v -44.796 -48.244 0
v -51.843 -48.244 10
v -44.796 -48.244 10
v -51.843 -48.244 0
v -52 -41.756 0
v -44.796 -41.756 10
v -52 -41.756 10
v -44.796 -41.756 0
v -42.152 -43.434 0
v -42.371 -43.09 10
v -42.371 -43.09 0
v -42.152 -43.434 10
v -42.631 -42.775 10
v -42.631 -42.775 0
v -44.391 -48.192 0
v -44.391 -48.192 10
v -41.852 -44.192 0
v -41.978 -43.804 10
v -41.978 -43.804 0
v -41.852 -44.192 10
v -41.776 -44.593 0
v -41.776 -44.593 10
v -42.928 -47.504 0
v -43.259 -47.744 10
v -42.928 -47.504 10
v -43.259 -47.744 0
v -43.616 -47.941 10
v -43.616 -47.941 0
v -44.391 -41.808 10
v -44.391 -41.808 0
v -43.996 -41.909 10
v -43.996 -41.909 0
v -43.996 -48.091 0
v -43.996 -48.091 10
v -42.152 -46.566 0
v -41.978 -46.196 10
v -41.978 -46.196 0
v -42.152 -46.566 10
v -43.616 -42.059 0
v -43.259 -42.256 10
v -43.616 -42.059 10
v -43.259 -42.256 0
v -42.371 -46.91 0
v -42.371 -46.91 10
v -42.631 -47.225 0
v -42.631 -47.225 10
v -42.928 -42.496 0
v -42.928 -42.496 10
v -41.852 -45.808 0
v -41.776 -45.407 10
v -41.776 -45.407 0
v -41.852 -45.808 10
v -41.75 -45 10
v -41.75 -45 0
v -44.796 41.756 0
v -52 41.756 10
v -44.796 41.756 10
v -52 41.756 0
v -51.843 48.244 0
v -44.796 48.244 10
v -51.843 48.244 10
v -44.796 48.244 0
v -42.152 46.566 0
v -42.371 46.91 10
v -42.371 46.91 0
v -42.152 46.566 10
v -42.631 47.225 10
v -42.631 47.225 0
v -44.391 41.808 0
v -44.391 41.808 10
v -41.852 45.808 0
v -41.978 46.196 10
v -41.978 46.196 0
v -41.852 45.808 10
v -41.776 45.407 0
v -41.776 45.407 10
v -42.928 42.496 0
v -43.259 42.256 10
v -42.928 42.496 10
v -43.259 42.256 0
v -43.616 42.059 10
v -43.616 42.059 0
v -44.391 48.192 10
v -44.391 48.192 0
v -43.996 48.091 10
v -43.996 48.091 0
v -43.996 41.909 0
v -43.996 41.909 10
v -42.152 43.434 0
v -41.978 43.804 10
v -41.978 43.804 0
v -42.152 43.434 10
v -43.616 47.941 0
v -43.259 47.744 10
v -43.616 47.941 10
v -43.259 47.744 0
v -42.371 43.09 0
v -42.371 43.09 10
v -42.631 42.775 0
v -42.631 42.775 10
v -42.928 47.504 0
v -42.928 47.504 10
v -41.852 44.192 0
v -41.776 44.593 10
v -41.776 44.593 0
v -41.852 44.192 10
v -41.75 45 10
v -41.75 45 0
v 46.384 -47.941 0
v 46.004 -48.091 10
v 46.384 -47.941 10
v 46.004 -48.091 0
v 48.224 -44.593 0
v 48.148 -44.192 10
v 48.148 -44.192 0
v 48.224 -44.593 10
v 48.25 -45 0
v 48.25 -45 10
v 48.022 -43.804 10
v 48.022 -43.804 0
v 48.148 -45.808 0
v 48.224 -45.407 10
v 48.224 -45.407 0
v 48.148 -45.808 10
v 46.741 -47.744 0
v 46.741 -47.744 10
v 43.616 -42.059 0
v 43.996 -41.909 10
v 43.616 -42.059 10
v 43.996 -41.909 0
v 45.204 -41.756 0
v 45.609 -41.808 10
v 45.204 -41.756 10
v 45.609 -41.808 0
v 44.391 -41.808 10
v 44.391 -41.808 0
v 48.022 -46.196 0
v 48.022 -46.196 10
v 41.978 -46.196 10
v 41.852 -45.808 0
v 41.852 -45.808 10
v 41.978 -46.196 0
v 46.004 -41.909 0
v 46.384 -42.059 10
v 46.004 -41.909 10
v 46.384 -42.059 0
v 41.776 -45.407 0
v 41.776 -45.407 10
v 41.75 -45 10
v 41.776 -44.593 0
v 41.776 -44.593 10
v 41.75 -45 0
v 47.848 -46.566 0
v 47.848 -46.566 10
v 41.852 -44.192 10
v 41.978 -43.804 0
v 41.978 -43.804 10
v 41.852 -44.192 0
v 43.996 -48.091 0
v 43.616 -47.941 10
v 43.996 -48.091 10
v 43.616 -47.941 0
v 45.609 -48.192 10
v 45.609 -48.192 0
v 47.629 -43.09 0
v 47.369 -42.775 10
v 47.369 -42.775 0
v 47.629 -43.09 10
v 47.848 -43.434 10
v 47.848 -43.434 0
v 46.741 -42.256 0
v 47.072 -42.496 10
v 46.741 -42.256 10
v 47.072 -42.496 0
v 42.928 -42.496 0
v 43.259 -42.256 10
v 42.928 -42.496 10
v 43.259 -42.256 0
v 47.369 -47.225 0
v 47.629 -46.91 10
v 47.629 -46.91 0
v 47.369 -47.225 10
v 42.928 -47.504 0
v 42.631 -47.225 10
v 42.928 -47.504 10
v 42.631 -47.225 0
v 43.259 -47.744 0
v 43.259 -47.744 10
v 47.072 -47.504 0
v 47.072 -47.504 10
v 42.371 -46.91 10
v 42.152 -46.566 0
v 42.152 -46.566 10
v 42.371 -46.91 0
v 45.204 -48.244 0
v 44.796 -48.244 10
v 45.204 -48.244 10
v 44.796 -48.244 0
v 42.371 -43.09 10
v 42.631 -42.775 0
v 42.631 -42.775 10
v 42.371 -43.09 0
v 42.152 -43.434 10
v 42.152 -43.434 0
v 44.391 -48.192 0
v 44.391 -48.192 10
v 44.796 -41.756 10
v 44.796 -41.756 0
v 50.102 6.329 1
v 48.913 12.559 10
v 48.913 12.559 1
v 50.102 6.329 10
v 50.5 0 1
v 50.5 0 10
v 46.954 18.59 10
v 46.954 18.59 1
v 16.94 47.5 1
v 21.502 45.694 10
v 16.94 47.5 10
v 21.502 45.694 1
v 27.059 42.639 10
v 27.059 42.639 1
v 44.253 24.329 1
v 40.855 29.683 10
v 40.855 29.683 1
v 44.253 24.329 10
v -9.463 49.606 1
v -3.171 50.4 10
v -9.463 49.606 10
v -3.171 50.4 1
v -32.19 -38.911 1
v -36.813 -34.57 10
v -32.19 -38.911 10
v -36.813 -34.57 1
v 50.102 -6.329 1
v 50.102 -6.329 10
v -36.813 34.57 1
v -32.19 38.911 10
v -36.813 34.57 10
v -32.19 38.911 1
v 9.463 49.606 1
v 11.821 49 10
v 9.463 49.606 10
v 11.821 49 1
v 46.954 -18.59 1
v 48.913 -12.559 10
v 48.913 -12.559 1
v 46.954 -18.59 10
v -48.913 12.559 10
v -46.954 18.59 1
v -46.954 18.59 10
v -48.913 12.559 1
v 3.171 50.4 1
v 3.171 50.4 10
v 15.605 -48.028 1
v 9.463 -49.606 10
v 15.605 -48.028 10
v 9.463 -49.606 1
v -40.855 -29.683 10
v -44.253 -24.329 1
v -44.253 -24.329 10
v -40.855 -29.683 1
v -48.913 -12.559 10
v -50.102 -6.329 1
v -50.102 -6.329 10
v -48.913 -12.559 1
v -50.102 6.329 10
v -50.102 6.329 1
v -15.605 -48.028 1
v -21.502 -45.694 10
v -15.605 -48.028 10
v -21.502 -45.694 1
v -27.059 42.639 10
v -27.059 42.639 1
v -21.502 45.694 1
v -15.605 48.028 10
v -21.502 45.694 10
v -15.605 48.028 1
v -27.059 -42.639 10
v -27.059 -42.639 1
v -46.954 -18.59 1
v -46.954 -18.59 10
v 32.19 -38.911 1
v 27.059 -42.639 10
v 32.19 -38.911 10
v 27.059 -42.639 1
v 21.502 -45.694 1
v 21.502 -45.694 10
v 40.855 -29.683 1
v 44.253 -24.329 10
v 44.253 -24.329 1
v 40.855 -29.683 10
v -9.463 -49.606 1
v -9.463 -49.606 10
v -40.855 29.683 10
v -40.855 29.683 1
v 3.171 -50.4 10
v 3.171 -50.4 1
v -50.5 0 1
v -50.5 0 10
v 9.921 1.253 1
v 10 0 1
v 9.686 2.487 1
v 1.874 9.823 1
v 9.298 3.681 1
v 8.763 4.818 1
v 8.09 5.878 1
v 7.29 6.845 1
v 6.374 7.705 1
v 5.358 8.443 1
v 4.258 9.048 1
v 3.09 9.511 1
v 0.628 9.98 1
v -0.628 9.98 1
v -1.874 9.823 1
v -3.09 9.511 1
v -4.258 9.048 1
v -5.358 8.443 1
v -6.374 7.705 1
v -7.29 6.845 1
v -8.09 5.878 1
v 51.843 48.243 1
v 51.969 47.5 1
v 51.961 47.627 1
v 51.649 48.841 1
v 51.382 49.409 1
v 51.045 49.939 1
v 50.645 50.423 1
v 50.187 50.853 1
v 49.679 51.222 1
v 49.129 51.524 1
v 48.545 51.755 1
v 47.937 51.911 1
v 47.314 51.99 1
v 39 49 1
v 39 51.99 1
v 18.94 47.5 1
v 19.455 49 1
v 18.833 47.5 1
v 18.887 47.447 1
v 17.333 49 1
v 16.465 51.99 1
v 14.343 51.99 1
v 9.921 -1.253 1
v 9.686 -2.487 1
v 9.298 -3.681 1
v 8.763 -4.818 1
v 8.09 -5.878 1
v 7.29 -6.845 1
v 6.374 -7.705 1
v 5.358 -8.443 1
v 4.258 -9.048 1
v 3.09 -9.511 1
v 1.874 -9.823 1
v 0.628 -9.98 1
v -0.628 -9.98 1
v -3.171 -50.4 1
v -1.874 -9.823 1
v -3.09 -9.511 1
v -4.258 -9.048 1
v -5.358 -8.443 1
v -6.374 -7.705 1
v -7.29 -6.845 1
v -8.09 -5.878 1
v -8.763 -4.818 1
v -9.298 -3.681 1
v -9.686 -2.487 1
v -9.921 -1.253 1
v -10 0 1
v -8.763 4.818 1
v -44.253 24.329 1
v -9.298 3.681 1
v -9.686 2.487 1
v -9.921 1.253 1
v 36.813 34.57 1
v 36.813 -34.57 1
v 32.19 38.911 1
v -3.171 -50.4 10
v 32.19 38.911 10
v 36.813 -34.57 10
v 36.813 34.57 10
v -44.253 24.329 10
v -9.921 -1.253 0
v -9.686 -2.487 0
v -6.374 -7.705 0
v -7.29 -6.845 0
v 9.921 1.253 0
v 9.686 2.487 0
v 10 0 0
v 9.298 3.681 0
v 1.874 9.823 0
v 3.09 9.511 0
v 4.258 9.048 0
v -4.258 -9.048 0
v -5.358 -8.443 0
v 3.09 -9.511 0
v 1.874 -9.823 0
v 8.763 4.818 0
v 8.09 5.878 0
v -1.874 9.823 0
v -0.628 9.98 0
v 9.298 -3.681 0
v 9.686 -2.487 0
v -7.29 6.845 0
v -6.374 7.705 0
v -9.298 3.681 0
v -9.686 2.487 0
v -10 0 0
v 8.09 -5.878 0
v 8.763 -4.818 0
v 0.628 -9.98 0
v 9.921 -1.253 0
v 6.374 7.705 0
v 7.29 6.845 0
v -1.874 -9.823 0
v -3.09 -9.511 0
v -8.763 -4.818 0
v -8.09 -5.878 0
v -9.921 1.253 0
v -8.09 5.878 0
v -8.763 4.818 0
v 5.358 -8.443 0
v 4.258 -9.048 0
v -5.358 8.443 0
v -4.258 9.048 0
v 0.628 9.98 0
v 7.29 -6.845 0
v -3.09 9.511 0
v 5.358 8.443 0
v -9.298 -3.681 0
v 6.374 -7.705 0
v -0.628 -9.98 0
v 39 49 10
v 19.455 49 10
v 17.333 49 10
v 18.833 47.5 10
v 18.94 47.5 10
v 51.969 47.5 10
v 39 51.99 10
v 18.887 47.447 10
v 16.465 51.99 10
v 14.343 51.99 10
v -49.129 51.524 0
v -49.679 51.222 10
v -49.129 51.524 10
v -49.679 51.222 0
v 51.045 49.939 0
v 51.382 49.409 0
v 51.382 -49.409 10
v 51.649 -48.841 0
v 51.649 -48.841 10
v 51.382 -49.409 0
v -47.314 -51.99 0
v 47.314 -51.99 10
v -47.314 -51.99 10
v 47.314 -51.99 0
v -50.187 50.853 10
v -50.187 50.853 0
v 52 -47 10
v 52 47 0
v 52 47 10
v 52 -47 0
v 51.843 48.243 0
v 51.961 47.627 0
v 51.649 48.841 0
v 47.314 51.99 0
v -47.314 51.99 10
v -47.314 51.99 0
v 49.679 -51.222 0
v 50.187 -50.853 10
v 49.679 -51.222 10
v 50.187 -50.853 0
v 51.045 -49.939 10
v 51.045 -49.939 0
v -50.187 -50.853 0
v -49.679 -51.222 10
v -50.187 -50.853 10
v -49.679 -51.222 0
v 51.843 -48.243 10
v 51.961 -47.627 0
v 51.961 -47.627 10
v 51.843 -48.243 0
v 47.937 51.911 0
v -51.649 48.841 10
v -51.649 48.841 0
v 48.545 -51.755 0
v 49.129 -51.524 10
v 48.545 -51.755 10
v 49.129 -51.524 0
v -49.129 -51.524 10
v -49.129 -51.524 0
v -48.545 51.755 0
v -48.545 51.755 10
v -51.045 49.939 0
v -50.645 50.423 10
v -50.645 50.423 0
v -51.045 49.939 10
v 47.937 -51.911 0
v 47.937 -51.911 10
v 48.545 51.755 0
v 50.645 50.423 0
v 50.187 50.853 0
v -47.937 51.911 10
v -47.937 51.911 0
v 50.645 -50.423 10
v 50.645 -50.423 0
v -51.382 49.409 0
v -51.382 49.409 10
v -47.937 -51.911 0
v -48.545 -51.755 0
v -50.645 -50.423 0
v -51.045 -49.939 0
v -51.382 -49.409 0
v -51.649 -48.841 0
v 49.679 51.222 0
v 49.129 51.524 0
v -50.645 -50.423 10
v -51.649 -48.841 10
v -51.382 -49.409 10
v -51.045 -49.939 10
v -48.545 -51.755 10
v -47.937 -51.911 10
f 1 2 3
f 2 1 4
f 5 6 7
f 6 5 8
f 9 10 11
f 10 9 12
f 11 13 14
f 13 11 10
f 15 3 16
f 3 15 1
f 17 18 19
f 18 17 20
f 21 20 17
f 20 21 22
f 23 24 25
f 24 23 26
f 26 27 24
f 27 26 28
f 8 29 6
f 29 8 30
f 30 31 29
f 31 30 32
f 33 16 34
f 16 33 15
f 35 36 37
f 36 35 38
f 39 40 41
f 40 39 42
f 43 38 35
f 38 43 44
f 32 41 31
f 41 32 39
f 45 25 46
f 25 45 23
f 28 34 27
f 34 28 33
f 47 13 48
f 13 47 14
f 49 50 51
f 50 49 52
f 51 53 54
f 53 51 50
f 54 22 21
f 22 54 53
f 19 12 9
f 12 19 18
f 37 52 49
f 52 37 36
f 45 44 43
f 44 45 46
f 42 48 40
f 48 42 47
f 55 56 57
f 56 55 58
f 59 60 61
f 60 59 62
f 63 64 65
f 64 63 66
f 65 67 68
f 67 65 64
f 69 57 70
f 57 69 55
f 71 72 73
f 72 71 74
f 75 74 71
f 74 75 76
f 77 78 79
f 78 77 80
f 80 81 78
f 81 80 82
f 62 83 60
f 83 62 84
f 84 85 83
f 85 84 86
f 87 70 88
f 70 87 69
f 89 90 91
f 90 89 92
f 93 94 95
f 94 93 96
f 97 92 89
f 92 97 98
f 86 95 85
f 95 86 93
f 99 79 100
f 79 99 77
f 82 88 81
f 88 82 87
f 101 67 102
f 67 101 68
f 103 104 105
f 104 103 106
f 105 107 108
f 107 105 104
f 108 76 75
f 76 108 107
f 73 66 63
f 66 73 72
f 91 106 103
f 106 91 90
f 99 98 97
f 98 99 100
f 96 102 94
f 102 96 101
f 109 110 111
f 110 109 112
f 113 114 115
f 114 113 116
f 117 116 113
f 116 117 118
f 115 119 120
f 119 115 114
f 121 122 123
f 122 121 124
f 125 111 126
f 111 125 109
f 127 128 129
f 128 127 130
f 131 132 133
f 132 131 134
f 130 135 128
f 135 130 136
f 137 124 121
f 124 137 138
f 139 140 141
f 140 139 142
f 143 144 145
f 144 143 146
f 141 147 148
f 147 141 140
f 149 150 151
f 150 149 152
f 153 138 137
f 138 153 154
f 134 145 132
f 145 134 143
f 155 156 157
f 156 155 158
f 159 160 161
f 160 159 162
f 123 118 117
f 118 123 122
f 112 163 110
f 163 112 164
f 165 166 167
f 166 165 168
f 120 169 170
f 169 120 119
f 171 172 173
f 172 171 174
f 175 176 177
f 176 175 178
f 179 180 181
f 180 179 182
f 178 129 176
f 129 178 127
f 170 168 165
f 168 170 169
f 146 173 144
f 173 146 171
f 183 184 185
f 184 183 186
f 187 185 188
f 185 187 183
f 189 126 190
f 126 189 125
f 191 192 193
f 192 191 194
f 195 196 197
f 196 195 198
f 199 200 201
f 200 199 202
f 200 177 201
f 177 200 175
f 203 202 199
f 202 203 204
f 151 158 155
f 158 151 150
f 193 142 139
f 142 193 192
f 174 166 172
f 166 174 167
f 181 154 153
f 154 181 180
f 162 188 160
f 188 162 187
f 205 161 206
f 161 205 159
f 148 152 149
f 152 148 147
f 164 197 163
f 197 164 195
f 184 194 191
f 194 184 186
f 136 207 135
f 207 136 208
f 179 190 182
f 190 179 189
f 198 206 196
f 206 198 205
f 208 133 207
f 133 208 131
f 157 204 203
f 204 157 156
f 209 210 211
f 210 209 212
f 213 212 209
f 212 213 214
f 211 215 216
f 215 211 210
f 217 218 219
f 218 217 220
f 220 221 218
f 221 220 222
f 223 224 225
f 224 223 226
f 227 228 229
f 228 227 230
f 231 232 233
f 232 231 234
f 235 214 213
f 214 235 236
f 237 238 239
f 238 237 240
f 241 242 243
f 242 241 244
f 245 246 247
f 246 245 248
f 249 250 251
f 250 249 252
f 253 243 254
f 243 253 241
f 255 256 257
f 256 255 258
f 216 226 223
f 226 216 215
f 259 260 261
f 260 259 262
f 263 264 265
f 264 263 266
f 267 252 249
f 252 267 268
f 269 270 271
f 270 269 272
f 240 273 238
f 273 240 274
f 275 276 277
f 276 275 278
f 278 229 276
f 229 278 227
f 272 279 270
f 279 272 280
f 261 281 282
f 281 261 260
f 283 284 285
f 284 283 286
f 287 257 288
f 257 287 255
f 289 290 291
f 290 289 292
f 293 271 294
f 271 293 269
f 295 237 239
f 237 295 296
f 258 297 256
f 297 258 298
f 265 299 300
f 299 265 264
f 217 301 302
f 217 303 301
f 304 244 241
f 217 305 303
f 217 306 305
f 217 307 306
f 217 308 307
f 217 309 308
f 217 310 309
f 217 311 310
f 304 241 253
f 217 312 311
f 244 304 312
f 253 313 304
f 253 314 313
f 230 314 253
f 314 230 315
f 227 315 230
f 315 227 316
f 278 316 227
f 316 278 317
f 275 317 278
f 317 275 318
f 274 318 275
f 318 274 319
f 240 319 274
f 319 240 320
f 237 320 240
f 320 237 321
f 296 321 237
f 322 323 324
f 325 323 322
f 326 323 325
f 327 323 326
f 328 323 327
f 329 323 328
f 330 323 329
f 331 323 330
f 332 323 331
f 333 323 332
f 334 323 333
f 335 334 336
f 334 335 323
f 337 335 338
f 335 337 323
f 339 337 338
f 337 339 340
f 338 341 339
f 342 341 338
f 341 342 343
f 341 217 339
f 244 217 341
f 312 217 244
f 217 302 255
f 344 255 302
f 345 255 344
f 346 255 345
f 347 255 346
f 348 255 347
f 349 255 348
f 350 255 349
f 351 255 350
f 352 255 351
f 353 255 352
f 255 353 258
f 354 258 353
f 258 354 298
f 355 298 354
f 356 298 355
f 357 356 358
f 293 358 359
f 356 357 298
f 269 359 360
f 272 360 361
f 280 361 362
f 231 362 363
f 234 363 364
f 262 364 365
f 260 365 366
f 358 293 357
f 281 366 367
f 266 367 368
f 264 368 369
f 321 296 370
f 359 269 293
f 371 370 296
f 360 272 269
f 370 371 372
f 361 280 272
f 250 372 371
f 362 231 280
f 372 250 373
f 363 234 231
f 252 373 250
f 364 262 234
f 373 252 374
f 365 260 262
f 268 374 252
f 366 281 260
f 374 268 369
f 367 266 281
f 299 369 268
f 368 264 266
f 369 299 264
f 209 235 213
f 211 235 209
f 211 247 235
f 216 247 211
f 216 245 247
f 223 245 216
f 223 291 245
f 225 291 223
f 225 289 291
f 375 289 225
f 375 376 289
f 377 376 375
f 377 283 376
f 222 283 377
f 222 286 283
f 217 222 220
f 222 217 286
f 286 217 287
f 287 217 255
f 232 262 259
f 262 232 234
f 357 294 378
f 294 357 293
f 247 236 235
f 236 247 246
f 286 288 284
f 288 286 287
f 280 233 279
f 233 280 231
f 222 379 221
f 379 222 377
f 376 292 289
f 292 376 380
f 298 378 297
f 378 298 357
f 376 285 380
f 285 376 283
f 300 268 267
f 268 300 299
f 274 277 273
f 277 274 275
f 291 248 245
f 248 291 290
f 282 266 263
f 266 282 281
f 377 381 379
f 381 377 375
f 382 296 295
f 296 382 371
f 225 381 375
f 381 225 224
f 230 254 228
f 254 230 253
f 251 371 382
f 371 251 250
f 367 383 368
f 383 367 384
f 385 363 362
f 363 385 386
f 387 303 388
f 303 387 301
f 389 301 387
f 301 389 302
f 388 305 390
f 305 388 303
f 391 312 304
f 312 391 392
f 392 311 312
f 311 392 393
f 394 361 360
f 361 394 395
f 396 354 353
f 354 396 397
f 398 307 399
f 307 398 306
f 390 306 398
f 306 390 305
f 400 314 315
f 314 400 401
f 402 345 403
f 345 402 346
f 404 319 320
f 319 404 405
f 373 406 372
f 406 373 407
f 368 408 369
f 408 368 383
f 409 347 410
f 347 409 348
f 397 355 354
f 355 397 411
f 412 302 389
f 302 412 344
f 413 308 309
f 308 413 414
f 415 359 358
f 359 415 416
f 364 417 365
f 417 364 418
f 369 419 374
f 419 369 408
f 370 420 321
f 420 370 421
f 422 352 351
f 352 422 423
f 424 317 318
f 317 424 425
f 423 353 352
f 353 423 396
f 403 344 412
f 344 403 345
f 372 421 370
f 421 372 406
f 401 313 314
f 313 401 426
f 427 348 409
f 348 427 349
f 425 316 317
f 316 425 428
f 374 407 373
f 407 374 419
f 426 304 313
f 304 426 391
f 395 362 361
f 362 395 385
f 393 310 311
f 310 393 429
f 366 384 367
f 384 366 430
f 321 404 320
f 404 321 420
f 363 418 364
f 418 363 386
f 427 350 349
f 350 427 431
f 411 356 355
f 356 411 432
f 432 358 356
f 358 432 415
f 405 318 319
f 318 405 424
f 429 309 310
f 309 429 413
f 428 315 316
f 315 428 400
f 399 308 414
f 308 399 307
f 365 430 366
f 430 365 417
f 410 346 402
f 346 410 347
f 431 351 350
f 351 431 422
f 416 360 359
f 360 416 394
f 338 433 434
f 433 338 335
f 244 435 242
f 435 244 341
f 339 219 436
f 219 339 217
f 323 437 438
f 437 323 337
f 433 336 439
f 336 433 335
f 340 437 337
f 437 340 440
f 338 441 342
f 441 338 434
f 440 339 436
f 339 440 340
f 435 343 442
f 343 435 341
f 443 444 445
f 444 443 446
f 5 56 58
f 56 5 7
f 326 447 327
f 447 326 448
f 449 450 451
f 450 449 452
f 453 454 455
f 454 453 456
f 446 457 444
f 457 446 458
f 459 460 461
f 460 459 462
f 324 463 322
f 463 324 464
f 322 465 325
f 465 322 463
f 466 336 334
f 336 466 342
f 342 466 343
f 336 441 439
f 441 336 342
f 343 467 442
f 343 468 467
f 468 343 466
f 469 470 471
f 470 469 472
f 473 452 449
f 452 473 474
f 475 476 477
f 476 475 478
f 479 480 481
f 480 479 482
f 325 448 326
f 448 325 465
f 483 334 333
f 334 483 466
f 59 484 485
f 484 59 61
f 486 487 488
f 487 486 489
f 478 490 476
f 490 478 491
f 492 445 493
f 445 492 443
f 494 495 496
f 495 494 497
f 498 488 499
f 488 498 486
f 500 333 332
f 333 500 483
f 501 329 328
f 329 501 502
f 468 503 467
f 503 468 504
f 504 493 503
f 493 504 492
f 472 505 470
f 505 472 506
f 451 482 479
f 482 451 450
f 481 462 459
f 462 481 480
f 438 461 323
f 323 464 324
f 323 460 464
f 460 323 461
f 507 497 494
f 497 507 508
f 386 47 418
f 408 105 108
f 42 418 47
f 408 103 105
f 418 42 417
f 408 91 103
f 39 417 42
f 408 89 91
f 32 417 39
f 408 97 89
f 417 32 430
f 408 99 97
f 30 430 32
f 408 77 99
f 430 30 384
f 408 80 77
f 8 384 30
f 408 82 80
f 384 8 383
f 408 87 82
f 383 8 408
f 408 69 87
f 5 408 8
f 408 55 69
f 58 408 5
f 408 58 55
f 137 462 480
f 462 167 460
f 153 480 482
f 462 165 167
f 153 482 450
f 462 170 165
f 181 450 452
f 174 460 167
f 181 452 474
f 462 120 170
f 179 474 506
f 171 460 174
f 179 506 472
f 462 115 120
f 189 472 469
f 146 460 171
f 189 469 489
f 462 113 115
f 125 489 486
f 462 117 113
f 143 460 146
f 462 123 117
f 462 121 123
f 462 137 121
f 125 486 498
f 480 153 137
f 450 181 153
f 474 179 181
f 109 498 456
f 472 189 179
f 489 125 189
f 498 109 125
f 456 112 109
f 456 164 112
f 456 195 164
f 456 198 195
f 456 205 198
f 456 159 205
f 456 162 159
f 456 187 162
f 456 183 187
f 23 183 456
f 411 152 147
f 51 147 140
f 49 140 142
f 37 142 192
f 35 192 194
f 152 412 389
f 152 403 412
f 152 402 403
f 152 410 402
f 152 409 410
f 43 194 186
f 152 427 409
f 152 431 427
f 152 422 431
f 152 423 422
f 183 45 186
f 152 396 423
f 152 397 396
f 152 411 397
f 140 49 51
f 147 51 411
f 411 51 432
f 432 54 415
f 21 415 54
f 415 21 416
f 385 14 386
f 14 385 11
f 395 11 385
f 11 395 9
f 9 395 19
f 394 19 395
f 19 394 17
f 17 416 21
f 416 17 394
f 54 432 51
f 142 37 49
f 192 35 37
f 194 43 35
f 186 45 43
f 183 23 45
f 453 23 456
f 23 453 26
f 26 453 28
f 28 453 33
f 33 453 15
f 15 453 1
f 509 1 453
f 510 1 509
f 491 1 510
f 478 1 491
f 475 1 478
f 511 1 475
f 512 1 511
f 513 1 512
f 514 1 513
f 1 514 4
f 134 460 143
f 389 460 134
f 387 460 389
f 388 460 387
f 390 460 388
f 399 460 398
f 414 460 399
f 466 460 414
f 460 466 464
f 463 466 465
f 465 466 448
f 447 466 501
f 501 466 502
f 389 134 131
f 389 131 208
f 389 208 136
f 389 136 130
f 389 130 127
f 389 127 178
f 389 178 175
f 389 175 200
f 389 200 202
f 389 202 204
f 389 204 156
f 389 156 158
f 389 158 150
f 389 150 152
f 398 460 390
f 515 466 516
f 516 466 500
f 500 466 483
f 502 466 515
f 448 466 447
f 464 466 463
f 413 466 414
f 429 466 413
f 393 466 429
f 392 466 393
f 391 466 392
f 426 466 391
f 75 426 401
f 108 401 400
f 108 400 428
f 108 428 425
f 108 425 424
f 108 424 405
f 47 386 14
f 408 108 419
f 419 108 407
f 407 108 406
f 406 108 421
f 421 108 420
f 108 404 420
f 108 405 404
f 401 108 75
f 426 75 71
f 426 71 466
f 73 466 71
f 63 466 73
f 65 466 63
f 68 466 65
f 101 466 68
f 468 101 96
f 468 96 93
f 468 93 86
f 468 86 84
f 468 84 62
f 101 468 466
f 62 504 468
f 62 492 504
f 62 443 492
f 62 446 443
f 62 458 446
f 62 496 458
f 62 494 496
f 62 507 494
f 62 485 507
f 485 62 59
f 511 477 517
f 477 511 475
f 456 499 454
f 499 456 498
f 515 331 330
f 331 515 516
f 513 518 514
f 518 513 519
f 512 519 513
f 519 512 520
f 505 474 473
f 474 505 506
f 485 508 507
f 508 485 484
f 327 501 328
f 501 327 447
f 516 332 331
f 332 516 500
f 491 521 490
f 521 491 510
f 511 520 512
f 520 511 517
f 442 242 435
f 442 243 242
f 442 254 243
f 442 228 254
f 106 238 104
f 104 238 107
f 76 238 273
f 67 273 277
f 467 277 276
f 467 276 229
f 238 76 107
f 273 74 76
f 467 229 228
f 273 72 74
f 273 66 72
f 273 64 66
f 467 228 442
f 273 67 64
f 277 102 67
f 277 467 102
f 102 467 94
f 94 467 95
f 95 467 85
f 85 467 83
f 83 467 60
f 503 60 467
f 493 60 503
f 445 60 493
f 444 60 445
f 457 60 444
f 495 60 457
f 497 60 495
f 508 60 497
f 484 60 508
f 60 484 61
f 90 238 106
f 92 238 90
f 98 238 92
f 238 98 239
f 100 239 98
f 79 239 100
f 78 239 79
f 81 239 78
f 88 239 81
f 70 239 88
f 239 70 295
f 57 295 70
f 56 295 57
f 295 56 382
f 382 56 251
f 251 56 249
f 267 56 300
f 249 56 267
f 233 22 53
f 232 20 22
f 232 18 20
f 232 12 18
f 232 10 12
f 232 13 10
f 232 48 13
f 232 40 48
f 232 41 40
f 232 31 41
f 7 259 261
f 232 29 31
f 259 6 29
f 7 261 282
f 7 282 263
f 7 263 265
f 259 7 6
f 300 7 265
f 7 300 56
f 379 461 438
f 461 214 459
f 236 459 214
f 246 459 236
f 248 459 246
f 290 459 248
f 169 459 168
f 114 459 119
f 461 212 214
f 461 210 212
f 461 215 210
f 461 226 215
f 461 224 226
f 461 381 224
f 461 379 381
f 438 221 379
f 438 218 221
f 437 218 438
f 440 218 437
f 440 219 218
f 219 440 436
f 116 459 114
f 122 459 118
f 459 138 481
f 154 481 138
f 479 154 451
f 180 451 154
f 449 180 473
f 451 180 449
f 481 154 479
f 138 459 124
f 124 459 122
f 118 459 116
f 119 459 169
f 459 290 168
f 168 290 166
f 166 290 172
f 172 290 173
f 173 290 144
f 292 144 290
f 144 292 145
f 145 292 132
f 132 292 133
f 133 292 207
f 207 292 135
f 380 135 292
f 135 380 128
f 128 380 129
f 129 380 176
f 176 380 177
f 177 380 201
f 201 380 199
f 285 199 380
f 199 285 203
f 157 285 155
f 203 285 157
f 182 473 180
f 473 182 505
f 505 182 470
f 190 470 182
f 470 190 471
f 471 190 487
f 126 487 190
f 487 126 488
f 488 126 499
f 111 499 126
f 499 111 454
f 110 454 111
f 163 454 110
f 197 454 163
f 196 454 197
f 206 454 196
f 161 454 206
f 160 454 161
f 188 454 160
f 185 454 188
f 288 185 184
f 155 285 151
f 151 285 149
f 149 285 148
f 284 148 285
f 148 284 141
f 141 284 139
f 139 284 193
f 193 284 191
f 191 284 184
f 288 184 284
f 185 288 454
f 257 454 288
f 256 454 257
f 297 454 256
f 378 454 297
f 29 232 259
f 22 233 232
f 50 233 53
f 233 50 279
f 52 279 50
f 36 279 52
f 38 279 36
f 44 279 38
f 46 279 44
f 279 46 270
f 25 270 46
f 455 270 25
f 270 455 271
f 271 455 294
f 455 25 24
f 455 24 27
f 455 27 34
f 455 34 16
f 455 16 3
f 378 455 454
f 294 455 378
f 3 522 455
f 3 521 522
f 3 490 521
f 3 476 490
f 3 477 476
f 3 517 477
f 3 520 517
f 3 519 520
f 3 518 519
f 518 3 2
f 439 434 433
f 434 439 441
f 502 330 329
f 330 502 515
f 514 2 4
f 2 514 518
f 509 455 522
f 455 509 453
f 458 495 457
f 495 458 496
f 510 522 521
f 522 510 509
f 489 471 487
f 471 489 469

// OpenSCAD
$fn = 50;


difference() {
	union() {
		translate(v = [0, 0, 0]) {
			rotate(a = [0, 0, 0]) {
				hull() {
					translate(v = [-47.0000000000, 47.0000000000, 0]) {
						rotate(a = [0, 0, 0]) {
							translate(v = [0, 0, 0]) {
								rotate(a = [0, 0, 0]) {
									cylinder(h = 10, r = 5);
								}
							}
						}
					}
					translate(v = [47.0000000000, 47.0000000000, 0]) {
						rotate(a = [0, 0, 0]) {
							translate(v = [0, 0, 0]) {
								rotate(a = [0, 0, 0]) {
									cylinder(h = 10, r = 5);
								}
							}
						}
					}
					translate(v = [-47.0000000000, -47.0000000000, 0]) {
						rotate(a = [0, 0, 0]) {
							translate(v = [0, 0, 0]) {
								rotate(a = [0, 0, 0]) {
									cylinder(h = 10, r = 5);
								}
							}
						}
					}
					translate(v = [47.0000000000, -47.0000000000, 0]) {
						rotate(a = [0, 0, 0]) {
							translate(v = [0, 0, 0]) {
								rotate(a = [0, 0, 0]) {
									cylinder(h = 10, r = 5);
								}
							}
						}
					}
				}
			}
		}
	}
	union() {
		translate(v = [-52.5000000000, -45.0000000000, -125]) {
			rotate(a = [0, 0, 0]) {
				hull() {
					translate(v = [7.5000000000, 0, 0]) {
						rotate(a = [0, 0, 0]) {
							translate(v = [0, 0, 0]) {
								rotate(a = [0, 0, 0]) {
									cylinder(h = 250, r = 3.2500000000);
								}
							}
						}
					}
					translate(v = [-7.5000000000, 0, 0]) {
						rotate(a = [0, 0, 0]) {
							translate(v = [0, 0, 0]) {
								rotate(a = [0, 0, 0]) {
									cylinder(h = 250, r = 3.2500000000);
								}
							}
						}
					}
				}
			}
		}
		translate(v = [-52.5000000000, 45.0000000000, -125]) {
			rotate(a = [0, 0, 0]) {
				hull() {
					translate(v = [7.5000000000, 0, 0]) {
						rotate(a = [0, 0, 0]) {
							translate(v = [0, 0, 0]) {
								rotate(a = [0, 0, 0]) {
									cylinder(h = 250, r = 3.2500000000);
								}
							}
						}
					}
					translate(v = [-7.5000000000, 0, 0]) {
						rotate(a = [0, 0, 0]) {
							translate(v = [0, 0, 0]) {
								rotate(a = [0, 0, 0]) {
									cylinder(h = 250, r = 3.2500000000);
								}
							}
						}
					}
				}
			}
		}
		translate(v = [45.0000000000, -45.0000000000, -125.0000000000]) {
			rotate(a = [0, 0, 0]) {
				cylinder(h = 250, r = 3.2500000000);
			}
		}
		translate(v = [0, 0, 1.0000000000]) {
			rotate(a = [0, 0, 0]) {
				cylinder(h = 12, r = 50.5000000000);
			}
		}
		translate(v = [0, 0, -5.0000000000]) {
			rotate(a = [0, 0, 0]) {
				cylinder(h = 10, r = 10.0000000000);
			}
		}
		translate(v = [0.0000000000, 47.5000000000, 1]) {
			rotate(a = [0, 0, 0]) {
				cube(size = [52.0000000000, 1.5000000000, 12]);
			}
		}
		translate(v = [39.0000000000, 47.5000000000, 1]) {
			rotate(a = [0, 0, 0]) {
				cube(size = [13.0000000000, 4.5000000000, 12]);
			}
		}
		translate(v = [13.5833333333, 52.7500000000, 1]) {
			rotate(a = [0, 0, -45]) {
				cube(size = [7.5000000000, 1.5000000000, 12]);
			}
		}
	}
}
